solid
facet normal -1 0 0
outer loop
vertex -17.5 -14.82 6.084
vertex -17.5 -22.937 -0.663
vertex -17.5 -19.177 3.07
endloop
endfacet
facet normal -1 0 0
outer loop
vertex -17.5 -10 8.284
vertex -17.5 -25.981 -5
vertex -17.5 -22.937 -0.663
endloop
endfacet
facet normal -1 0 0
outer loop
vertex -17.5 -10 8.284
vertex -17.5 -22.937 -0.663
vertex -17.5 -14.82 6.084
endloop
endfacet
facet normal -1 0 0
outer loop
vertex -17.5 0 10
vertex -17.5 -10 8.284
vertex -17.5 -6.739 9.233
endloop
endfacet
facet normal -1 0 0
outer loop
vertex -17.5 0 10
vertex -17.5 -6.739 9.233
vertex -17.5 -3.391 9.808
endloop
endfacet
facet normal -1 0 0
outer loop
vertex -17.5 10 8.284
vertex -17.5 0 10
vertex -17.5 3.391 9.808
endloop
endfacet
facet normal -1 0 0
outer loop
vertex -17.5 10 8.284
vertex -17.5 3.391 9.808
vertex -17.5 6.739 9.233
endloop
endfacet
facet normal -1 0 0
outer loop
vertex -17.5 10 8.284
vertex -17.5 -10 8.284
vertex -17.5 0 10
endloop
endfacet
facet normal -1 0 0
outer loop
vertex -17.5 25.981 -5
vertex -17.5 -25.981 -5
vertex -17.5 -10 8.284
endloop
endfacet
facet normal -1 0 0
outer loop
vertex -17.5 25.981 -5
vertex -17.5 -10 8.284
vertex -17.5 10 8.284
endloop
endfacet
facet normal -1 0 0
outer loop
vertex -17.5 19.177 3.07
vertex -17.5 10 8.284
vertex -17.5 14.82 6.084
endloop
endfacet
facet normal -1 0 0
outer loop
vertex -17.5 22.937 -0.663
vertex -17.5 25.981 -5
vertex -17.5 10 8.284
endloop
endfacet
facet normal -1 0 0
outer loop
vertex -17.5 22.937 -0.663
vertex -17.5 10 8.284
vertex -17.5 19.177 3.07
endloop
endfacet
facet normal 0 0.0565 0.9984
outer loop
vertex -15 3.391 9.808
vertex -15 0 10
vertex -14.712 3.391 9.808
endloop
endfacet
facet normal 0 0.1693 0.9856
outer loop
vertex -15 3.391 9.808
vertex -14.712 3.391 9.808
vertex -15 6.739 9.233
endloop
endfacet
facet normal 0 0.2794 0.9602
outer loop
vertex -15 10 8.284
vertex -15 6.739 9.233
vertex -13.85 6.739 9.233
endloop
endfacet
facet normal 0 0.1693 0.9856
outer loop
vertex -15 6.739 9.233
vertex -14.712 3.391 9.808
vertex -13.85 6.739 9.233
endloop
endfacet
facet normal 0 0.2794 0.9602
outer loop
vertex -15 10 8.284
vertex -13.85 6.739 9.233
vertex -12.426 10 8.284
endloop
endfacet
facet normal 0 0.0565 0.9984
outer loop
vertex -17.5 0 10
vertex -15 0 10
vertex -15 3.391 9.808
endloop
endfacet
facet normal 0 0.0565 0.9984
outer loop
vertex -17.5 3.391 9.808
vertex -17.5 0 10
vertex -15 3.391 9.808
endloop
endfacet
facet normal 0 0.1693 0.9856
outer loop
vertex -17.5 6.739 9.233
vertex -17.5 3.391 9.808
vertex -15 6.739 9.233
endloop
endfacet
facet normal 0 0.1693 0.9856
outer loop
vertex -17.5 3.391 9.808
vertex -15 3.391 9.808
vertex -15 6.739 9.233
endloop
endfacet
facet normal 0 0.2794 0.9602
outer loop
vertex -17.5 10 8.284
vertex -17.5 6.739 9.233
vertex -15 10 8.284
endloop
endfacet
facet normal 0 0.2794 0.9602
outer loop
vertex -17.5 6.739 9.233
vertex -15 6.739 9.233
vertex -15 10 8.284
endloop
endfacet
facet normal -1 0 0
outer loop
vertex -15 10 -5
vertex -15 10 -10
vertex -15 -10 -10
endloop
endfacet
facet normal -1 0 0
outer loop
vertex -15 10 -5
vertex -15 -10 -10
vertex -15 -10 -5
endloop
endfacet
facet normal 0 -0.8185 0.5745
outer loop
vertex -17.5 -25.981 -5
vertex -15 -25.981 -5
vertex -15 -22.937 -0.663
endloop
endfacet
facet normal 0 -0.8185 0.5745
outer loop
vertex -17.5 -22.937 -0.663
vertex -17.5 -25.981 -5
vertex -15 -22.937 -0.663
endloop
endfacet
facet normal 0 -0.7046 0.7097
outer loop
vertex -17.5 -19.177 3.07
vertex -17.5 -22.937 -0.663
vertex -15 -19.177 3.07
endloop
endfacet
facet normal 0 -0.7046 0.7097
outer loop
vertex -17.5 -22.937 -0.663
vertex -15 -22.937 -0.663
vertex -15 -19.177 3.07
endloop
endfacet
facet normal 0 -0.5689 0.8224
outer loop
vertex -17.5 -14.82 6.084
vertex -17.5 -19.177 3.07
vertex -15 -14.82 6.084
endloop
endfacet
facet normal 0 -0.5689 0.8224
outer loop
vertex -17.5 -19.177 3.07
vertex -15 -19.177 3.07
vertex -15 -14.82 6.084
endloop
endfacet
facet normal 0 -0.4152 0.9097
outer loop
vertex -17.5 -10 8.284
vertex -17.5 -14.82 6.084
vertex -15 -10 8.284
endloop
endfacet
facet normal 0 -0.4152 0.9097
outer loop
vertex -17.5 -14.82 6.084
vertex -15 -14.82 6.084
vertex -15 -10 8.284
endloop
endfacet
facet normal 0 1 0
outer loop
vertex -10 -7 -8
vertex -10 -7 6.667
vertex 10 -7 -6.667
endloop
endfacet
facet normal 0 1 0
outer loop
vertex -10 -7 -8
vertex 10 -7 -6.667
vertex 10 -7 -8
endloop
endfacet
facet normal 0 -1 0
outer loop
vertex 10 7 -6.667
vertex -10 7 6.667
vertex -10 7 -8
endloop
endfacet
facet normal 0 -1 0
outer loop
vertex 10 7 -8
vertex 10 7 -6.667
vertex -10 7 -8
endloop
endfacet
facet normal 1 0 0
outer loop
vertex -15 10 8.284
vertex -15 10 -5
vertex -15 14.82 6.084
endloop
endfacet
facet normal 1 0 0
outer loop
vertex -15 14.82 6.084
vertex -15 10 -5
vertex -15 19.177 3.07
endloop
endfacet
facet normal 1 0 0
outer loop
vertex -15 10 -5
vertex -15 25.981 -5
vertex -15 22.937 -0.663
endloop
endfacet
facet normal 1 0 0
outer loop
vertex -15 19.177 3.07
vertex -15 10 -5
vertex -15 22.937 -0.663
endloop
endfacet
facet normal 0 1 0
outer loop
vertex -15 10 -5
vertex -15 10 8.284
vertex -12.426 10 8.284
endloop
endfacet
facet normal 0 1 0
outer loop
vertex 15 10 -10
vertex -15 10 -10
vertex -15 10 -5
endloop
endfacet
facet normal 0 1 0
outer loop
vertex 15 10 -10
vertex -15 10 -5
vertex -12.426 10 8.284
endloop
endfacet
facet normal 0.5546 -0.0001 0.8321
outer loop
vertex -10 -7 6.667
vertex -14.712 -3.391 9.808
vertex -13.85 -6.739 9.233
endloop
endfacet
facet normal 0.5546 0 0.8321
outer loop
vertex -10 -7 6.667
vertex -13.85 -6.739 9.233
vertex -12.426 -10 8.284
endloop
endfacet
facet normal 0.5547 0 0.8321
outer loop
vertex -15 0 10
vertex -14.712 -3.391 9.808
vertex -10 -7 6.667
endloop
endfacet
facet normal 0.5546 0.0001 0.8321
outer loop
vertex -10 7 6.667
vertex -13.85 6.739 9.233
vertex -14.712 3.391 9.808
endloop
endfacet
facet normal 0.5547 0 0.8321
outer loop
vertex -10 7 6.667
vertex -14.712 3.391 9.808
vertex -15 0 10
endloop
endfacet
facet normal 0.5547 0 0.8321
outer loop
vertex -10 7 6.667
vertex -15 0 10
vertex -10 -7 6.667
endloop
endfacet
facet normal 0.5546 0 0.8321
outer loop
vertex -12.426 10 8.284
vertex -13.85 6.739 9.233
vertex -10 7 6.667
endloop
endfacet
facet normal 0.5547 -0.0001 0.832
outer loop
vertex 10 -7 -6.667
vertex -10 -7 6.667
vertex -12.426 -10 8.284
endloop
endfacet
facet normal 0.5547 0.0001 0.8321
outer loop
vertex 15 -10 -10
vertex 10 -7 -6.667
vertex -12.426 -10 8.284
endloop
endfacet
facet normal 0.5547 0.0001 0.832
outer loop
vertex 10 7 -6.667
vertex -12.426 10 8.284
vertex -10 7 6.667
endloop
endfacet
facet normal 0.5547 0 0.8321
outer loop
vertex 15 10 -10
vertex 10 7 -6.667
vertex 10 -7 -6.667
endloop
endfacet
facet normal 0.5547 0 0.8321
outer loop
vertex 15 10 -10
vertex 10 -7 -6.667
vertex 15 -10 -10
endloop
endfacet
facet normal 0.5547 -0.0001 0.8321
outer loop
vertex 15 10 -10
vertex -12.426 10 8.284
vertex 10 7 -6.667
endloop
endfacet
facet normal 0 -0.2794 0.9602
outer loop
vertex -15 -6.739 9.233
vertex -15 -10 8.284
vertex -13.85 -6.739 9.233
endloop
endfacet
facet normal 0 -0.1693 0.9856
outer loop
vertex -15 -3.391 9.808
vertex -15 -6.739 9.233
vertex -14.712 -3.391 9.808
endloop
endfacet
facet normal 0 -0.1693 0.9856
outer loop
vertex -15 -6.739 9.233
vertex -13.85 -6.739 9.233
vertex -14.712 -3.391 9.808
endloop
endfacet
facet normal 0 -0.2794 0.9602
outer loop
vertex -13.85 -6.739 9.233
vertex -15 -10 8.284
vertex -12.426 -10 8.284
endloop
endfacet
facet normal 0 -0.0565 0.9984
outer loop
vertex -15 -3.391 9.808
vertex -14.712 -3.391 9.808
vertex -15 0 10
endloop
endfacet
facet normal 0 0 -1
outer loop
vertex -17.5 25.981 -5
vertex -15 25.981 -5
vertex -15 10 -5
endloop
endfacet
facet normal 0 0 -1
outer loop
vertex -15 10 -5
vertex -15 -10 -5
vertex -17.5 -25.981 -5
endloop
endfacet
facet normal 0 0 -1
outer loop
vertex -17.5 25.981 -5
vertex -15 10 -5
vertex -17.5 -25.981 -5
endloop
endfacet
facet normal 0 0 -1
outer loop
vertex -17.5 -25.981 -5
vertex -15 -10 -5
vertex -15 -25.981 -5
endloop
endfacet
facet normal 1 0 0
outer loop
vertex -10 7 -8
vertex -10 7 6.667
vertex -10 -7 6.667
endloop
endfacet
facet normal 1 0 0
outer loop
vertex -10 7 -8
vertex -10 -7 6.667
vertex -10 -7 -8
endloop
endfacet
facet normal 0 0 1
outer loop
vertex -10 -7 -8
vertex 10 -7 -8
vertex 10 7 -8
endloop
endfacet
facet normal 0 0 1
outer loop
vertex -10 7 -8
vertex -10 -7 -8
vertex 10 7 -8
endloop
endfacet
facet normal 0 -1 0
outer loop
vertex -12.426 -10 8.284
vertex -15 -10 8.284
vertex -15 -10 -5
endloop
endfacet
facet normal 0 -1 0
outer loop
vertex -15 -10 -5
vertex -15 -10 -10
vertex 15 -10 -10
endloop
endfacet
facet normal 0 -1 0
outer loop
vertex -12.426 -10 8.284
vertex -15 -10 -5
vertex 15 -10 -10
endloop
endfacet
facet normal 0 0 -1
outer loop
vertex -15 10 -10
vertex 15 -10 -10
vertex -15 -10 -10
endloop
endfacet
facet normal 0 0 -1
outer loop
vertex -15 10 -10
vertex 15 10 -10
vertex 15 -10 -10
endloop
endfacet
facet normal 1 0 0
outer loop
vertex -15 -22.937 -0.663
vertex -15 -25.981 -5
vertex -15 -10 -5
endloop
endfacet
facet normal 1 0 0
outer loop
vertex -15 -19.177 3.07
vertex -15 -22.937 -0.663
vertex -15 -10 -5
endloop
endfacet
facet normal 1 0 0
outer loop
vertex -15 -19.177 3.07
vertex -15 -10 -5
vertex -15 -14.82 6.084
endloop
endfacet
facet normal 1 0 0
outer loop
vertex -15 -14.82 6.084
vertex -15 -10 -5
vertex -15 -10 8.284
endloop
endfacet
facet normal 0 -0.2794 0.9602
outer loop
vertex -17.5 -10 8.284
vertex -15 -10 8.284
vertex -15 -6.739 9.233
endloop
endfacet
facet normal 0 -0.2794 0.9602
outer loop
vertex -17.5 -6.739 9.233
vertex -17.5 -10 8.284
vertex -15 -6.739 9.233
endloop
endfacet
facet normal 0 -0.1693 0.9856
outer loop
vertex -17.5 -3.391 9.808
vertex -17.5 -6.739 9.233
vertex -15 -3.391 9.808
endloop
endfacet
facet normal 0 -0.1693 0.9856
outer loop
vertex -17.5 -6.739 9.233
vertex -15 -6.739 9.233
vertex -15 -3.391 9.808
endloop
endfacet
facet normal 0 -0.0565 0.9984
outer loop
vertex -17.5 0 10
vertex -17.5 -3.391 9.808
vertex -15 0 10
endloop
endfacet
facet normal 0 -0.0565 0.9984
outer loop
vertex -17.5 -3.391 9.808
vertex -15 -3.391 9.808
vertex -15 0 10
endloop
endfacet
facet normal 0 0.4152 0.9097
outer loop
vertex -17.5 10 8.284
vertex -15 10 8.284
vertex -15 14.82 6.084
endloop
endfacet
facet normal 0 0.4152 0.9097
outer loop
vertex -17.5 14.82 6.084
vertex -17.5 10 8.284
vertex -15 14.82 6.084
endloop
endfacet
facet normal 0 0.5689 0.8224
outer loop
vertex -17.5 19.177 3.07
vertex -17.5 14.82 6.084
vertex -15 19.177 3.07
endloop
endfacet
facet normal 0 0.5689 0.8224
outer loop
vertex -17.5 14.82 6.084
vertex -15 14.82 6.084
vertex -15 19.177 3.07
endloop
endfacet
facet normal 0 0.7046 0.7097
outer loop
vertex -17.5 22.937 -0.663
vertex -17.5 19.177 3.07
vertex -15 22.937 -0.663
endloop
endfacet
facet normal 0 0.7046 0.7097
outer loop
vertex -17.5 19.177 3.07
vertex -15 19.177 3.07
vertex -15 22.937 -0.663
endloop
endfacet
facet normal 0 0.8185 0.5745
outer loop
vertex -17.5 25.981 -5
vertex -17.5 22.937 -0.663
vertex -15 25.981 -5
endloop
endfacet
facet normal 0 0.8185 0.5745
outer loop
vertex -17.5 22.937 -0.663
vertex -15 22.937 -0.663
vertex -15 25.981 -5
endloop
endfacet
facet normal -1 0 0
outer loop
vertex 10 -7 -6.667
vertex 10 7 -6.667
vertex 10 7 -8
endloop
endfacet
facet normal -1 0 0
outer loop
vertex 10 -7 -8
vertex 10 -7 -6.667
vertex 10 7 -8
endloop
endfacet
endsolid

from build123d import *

# Parameters (mm, degrees)
BOSS_EXTRUDE1_DEPTH     = 10
SKETCH2_W               = 16
SKETCH2_H               = 14
CUT_EXTRUDE1_DEPTH      = 10
BOSS_EXTRUDE2_DEPTH     = 2.5
CUT_EXTRUDE_THIN1_START = -32.5
SKETCH3_4_R             = 40
SKETCH3_4_R_2           = 30
CUT_EXTRUDE_THIN1_DEPTH = 32.5


with BuildPart() as part:
    # Sketch1 → Boss-Extrude1 (new, symmetric)
    with BuildSketch(Plane(origin=(0, 0, 0), x_dir=(1, 0, 0), z_dir=(0, 1, 0))):
        Polygon((-15, 10), (-15, -10), (15, 10), align=None)
    extrude(amount=BOSS_EXTRUDE1_DEPTH, both=True)

    # Sketch2 → Cut-Extrude1 (cut, symmetric)
    with BuildSketch(Plane(origin=(0, 0, 0), x_dir=(0, 0, -1), z_dir=(1, 0, 0))):
        Rectangle(SKETCH2_W, SKETCH2_H)
    extrude(amount=CUT_EXTRUDE1_DEPTH, both=True, mode=Mode.SUBTRACT)

    # Sketch3 → Boss-Extrude2 (add)
    with BuildSketch(Plane.ZY.offset(15)):
        with BuildLine():
            Line((-5, 25.980762114), (-5, -25.980762114))
            ThreePointArc((-5, -25.980762114), (10, 0), (-5, 25.980762114))
        make_face()
    extrude(amount=BOSS_EXTRUDE2_DEPTH)

    # Sketch3<4> → Cut-Extrude-Thin1 (cut)
    with BuildSketch(Plane.ZY.offset(15).offset(CUT_EXTRUDE_THIN1_START)):
        with Locations((-20, 0)):
            Circle(SKETCH3_4_R)
        with Locations((-20, 0)):
            Circle(SKETCH3_4_R_2, mode=Mode.SUBTRACT)
    extrude(amount=CUT_EXTRUDE_THIN1_DEPTH, mode=Mode.SUBTRACT)


solid = part.part
